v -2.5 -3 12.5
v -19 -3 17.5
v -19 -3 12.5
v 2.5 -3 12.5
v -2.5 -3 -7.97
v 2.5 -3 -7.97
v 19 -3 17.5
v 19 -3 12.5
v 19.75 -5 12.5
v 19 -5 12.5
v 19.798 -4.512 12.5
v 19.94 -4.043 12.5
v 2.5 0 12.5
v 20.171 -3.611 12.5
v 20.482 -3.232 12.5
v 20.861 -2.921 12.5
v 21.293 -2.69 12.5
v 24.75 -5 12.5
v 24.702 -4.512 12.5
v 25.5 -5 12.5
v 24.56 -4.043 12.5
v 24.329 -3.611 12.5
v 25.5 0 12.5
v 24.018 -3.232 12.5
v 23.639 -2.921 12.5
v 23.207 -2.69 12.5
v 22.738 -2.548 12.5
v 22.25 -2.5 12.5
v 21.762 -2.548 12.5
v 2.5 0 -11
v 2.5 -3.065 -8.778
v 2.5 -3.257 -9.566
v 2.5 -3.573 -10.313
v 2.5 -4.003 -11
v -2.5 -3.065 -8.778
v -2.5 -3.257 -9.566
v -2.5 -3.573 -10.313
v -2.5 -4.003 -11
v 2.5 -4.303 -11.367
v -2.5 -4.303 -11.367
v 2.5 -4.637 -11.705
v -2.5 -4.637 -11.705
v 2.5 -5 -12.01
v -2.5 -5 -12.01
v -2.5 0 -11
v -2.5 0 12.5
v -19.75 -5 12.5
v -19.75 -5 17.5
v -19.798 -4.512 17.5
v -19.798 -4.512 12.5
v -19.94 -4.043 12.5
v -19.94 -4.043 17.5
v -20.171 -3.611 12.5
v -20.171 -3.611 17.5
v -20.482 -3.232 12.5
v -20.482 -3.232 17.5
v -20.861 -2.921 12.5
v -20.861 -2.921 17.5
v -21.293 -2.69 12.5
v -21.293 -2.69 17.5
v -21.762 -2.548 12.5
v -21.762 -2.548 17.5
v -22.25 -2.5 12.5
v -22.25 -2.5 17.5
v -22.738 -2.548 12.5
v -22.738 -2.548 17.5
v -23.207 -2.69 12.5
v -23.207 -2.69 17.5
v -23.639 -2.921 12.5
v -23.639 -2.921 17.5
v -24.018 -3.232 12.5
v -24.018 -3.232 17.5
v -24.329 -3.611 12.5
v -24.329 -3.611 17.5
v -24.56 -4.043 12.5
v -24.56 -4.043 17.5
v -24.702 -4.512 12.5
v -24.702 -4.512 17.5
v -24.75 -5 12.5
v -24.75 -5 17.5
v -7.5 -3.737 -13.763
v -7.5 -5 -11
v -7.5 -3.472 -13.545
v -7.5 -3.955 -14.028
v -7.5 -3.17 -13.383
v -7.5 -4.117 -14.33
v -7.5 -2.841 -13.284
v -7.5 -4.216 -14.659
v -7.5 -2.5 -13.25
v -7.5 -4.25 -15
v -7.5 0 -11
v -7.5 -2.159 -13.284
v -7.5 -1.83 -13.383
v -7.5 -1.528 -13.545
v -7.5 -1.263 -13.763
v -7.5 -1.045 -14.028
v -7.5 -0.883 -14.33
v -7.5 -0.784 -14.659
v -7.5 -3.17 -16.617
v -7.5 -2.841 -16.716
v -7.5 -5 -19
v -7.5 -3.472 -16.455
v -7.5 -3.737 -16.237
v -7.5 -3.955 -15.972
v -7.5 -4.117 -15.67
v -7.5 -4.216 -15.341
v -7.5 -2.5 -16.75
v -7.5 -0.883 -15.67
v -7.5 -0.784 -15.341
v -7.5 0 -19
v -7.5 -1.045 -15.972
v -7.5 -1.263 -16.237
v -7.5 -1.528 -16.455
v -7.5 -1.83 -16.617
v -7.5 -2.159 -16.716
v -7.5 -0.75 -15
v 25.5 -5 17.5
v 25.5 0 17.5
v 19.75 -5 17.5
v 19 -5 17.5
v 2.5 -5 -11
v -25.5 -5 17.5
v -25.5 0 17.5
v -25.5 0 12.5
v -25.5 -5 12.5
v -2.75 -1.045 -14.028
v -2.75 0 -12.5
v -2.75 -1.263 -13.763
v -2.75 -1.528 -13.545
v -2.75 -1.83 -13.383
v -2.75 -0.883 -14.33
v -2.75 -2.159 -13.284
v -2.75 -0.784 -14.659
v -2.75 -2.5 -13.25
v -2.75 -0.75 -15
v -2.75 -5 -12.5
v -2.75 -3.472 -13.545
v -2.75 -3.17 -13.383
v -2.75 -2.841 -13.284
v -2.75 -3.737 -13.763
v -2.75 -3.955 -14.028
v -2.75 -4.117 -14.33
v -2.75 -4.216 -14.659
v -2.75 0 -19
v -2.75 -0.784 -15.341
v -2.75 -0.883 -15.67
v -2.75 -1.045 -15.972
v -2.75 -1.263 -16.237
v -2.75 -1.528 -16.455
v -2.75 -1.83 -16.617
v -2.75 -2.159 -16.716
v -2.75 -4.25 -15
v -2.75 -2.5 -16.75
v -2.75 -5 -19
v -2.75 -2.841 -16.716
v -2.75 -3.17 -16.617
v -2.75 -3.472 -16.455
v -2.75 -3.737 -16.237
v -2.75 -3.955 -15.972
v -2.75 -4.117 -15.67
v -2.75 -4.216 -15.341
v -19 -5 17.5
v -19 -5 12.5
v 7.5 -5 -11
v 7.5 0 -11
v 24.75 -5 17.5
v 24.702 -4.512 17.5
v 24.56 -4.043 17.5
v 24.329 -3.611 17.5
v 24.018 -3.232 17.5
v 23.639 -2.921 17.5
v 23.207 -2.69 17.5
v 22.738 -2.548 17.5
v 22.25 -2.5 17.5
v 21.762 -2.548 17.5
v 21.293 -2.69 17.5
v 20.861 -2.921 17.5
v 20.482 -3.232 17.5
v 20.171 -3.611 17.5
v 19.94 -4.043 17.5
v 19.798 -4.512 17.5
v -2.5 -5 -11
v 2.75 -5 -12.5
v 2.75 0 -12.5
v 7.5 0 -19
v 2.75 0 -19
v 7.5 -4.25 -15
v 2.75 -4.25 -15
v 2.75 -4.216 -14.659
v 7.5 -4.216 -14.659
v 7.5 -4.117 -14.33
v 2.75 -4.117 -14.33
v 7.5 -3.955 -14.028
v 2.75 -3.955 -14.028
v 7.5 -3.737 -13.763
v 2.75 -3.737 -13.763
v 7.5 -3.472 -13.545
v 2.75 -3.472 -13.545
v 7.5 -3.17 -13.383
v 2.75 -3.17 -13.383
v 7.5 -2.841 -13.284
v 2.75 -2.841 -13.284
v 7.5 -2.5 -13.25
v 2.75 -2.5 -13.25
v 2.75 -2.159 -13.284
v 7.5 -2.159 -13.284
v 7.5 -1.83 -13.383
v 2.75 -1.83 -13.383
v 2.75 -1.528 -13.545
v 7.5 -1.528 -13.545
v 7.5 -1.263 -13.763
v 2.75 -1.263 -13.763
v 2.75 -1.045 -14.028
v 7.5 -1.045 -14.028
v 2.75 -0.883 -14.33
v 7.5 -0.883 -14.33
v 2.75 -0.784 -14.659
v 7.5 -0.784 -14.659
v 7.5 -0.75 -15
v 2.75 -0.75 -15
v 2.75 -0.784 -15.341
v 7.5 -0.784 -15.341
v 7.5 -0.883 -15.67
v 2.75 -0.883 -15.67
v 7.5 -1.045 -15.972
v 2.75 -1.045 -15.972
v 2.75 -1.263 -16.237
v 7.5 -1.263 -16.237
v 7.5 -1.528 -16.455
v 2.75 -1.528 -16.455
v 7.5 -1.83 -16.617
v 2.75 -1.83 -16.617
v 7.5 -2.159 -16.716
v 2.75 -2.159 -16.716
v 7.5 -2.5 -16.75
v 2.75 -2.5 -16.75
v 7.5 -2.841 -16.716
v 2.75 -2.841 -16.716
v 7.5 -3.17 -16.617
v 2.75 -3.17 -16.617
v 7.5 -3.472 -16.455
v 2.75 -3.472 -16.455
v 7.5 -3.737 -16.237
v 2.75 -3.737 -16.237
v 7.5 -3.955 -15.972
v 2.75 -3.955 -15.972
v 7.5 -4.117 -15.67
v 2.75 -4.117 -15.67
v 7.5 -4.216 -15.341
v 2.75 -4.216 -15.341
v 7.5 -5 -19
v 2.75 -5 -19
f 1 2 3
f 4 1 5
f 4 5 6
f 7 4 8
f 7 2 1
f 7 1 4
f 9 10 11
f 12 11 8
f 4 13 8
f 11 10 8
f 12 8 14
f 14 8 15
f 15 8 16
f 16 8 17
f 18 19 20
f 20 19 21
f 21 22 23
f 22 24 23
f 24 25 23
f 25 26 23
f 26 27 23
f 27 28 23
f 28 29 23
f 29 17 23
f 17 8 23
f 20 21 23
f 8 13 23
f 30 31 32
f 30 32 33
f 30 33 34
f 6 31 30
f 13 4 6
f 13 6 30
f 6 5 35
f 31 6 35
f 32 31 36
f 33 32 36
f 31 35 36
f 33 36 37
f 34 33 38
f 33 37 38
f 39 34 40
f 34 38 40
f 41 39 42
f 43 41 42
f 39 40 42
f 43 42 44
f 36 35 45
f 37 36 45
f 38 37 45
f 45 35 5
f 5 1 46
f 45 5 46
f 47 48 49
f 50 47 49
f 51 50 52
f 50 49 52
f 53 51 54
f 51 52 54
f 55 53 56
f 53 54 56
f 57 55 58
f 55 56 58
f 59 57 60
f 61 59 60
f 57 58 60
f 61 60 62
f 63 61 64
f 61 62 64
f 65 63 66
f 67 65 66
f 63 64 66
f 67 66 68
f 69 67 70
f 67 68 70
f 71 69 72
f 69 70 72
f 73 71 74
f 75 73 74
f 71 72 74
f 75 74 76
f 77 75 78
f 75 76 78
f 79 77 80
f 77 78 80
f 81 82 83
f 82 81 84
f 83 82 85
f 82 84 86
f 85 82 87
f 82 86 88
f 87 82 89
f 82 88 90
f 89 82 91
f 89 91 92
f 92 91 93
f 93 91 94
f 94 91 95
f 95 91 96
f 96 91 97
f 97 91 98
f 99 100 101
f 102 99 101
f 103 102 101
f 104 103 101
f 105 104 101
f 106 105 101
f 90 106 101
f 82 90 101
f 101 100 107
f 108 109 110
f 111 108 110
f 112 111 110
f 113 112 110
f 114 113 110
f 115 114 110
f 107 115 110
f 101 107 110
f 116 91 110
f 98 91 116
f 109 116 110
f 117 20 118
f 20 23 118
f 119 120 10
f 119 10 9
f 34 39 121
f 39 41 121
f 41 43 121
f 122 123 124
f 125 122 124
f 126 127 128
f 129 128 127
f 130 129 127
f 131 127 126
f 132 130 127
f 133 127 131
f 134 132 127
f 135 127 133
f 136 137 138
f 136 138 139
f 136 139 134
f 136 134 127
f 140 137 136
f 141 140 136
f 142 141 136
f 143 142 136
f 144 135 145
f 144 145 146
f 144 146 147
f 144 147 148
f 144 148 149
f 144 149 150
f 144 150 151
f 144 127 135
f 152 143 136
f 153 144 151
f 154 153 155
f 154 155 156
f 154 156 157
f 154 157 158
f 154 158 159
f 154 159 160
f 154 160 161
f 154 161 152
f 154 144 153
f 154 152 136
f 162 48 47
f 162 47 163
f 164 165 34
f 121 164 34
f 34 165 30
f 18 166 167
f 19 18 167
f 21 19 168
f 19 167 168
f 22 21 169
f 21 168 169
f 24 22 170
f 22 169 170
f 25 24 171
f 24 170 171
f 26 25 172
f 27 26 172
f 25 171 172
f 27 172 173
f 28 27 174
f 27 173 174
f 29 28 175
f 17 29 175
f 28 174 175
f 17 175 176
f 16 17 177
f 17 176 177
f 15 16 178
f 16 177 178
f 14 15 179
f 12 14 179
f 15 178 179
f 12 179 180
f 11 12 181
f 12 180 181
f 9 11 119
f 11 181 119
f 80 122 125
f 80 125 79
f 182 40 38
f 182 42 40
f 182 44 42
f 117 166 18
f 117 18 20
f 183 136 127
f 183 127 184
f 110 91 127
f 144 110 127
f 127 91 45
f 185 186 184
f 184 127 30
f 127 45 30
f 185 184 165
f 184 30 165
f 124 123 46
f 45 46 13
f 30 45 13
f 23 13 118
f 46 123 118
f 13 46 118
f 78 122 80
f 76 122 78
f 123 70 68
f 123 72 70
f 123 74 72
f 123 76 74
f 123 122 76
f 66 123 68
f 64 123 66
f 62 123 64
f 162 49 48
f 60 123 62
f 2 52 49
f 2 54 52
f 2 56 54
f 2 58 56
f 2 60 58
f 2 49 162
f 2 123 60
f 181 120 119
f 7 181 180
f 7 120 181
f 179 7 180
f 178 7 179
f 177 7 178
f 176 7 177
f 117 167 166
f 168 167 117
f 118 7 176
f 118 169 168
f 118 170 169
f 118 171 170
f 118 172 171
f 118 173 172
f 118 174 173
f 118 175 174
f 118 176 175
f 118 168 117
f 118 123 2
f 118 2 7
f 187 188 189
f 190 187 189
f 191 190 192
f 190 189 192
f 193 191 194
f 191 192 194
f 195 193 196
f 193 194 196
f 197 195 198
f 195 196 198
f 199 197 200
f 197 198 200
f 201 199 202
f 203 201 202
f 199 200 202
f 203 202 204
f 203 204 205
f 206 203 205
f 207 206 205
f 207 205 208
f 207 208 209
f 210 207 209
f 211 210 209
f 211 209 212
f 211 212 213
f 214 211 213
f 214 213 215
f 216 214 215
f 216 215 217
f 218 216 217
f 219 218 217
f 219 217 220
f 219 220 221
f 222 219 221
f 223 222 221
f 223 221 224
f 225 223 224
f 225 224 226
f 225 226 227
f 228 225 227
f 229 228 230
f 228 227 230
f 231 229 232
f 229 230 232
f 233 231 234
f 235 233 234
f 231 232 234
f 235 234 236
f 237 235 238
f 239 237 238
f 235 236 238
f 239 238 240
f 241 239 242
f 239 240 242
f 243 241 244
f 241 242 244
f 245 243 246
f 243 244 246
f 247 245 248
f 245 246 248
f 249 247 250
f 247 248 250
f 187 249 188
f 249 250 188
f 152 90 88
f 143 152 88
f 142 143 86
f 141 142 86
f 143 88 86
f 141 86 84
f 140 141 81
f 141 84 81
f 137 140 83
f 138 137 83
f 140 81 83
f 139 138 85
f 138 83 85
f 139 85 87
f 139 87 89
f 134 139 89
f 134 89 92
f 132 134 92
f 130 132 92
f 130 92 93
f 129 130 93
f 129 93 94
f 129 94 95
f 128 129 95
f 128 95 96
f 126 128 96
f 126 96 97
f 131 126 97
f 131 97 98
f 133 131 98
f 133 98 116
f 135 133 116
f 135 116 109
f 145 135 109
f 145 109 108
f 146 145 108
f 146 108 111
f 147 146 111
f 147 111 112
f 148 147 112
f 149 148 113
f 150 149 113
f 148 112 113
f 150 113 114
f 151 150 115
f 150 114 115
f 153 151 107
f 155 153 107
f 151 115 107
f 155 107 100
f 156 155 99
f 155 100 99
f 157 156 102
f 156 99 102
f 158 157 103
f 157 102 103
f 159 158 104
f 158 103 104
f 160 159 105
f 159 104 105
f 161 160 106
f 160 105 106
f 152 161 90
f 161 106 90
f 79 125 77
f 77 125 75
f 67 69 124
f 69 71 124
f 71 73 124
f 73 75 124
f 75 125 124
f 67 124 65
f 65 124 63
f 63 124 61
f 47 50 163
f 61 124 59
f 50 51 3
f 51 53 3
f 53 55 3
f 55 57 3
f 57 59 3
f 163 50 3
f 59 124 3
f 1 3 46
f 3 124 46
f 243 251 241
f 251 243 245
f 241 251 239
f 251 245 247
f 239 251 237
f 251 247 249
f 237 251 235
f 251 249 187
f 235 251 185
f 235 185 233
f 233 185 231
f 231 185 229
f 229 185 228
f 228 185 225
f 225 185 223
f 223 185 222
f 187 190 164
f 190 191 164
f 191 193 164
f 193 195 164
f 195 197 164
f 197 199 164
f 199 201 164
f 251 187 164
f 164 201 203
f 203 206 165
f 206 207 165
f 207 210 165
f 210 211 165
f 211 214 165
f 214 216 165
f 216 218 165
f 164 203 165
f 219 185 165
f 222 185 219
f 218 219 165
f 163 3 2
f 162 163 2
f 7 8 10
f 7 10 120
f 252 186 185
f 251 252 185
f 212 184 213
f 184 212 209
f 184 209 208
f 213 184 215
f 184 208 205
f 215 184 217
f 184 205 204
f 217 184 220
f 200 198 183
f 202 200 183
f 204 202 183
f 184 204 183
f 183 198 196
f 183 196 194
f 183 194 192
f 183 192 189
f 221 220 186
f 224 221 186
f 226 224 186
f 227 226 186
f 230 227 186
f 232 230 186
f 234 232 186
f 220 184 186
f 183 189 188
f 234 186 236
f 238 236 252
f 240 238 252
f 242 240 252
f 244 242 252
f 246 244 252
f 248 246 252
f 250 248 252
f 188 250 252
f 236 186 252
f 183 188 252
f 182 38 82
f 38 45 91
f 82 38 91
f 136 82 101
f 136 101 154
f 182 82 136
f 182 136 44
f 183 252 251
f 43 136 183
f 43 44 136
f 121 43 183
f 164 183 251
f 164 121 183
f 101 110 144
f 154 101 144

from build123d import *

# Parameters (mm, degrees)
F0_W        = 5
F0_H        = 2.5
F0_H_2      = 23.5
F0_H_3      = 4
F1_DEPTH    = 5
F2_W        = 5.5
F2_H        = 5.6794419712
F3_DEPTH    = 6.5
F4_R        = 1.75
F5_DEPTH    = 25.4
F6_W        = 5
F6_H        = 24.5096784085
F6_W_2      = 23
F6_H_2      = 5
F7_DEPTH    = 2
F8_T1_DEPTH = 5
F9_W        = 6.5
F9_H        = 5
F10_DEPTH   = 2
F11_R       = 2.5
F12_DEPTH   = 36.501


# Not quite as in the source:
# - a fillet or chamfer that OpenCascade refuses, or shapes differently, is made with other operations: its cross-section is extruded or revolved along the edge and cut away or added


with BuildPart() as f1:
    # F0 (on Front) → F1 (new body)
    with BuildSketch(Plane.XZ):
        with Locations((0, 13.75)):
            Rectangle(F0_W, F0_H)
        Polygon((-2.5, 15), (2.5, 15), (2.5, 12.5), (25.5, 12.5), (25.5, 17.5), (-25.5, 17.5), (-25.5, 12.5), (-2.5, 12.5), align=None)
        with Locations((0, 0.75)):
            Rectangle(F0_W, F0_H_2)
        Polygon((7.5, -11), (2.5, -11), (2.5, -15), (-2.5, -15), (-2.5, -11), (-7.5, -11), (-7.5, -19), (7.5, -19), align=None)
        with Locations((0, -13)):
            Rectangle(F0_W, F0_H_3)
    extrude(amount=F1_DEPTH)

    # F2 (on face) → F3 (cut)
    with BuildSketch(Plane(origin=(0, 0, -19), x_dir=(1, 0, 0), z_dir=(0, 0, -1))):
        with Locations((0, 2.1602790144)):
            Rectangle(F2_W, F2_H)
    extrude(amount=-F3_DEPTH, mode=Mode.SUBTRACT)

    # F4 (on face) → F5 (cut)
    with BuildSketch(Plane(origin=(-7.5, 0, 0), x_dir=(0, -1, 0), z_dir=(-1, 0, 0))):
        with Locations((2.5, -15)):
            Circle(F4_R)
    extrude(amount=-F5_DEPTH, mode=Mode.SUBTRACT)

    # F6 (on face) → F7 (cut)
    with BuildSketch(Plane.XZ.offset(5)):
        with Locations((0, 0.2451607957)):
            Rectangle(F6_W, F6_H)
        with Locations((-14, 15)):
            Rectangle(F6_W_2, F6_H_2)
        with Locations((0, 15)):
            Rectangle(F6_W, F6_H_2)
        with Locations((14, 15)):
            Rectangle(F6_W_2, F6_H_2)
    extrude(amount=-F7_DEPTH, mode=Mode.SUBTRACT)

    # F8: fillet of radius 5.08 on 1 edges, made by hand

    # F8_s2 → F8_t1 (join)
    with BuildSketch(Plane.YZ.offset(-2.5)):
        with BuildLine():
            ThreePointArc((-3, -7.9698764332), (-3.5273743839, -10.2237619671), (-5, -12.0096784085))
            Line((-5, -12.0096784085), (-3, -12.0096784085))
            Line((-3, -12.0096784085), (-3, -7.9698764332))
        make_face()
    extrude(amount=F8_T1_DEPTH)

    # F9 (on face) → F10 (join)
    with BuildSketch(Plane.XZ.offset(3)):
        with Locations((22.25, 15)):
            Rectangle(F9_W, F9_H)
        with Locations((-22.25, 15)):
            Rectangle(F9_W, F9_H)
    extrude(amount=F10_DEPTH)

    # F11 (on face) → F12 (cut, through all)
    with BuildSketch(Plane.XY.offset(17.5)):
        with Locations((22.25, -5)):
            Circle(F11_R)
        with Locations((-22.25, -5)):
            Circle(F11_R)
    extrude(amount=-F12_DEPTH, mode=Mode.SUBTRACT)


solid = f1.part
